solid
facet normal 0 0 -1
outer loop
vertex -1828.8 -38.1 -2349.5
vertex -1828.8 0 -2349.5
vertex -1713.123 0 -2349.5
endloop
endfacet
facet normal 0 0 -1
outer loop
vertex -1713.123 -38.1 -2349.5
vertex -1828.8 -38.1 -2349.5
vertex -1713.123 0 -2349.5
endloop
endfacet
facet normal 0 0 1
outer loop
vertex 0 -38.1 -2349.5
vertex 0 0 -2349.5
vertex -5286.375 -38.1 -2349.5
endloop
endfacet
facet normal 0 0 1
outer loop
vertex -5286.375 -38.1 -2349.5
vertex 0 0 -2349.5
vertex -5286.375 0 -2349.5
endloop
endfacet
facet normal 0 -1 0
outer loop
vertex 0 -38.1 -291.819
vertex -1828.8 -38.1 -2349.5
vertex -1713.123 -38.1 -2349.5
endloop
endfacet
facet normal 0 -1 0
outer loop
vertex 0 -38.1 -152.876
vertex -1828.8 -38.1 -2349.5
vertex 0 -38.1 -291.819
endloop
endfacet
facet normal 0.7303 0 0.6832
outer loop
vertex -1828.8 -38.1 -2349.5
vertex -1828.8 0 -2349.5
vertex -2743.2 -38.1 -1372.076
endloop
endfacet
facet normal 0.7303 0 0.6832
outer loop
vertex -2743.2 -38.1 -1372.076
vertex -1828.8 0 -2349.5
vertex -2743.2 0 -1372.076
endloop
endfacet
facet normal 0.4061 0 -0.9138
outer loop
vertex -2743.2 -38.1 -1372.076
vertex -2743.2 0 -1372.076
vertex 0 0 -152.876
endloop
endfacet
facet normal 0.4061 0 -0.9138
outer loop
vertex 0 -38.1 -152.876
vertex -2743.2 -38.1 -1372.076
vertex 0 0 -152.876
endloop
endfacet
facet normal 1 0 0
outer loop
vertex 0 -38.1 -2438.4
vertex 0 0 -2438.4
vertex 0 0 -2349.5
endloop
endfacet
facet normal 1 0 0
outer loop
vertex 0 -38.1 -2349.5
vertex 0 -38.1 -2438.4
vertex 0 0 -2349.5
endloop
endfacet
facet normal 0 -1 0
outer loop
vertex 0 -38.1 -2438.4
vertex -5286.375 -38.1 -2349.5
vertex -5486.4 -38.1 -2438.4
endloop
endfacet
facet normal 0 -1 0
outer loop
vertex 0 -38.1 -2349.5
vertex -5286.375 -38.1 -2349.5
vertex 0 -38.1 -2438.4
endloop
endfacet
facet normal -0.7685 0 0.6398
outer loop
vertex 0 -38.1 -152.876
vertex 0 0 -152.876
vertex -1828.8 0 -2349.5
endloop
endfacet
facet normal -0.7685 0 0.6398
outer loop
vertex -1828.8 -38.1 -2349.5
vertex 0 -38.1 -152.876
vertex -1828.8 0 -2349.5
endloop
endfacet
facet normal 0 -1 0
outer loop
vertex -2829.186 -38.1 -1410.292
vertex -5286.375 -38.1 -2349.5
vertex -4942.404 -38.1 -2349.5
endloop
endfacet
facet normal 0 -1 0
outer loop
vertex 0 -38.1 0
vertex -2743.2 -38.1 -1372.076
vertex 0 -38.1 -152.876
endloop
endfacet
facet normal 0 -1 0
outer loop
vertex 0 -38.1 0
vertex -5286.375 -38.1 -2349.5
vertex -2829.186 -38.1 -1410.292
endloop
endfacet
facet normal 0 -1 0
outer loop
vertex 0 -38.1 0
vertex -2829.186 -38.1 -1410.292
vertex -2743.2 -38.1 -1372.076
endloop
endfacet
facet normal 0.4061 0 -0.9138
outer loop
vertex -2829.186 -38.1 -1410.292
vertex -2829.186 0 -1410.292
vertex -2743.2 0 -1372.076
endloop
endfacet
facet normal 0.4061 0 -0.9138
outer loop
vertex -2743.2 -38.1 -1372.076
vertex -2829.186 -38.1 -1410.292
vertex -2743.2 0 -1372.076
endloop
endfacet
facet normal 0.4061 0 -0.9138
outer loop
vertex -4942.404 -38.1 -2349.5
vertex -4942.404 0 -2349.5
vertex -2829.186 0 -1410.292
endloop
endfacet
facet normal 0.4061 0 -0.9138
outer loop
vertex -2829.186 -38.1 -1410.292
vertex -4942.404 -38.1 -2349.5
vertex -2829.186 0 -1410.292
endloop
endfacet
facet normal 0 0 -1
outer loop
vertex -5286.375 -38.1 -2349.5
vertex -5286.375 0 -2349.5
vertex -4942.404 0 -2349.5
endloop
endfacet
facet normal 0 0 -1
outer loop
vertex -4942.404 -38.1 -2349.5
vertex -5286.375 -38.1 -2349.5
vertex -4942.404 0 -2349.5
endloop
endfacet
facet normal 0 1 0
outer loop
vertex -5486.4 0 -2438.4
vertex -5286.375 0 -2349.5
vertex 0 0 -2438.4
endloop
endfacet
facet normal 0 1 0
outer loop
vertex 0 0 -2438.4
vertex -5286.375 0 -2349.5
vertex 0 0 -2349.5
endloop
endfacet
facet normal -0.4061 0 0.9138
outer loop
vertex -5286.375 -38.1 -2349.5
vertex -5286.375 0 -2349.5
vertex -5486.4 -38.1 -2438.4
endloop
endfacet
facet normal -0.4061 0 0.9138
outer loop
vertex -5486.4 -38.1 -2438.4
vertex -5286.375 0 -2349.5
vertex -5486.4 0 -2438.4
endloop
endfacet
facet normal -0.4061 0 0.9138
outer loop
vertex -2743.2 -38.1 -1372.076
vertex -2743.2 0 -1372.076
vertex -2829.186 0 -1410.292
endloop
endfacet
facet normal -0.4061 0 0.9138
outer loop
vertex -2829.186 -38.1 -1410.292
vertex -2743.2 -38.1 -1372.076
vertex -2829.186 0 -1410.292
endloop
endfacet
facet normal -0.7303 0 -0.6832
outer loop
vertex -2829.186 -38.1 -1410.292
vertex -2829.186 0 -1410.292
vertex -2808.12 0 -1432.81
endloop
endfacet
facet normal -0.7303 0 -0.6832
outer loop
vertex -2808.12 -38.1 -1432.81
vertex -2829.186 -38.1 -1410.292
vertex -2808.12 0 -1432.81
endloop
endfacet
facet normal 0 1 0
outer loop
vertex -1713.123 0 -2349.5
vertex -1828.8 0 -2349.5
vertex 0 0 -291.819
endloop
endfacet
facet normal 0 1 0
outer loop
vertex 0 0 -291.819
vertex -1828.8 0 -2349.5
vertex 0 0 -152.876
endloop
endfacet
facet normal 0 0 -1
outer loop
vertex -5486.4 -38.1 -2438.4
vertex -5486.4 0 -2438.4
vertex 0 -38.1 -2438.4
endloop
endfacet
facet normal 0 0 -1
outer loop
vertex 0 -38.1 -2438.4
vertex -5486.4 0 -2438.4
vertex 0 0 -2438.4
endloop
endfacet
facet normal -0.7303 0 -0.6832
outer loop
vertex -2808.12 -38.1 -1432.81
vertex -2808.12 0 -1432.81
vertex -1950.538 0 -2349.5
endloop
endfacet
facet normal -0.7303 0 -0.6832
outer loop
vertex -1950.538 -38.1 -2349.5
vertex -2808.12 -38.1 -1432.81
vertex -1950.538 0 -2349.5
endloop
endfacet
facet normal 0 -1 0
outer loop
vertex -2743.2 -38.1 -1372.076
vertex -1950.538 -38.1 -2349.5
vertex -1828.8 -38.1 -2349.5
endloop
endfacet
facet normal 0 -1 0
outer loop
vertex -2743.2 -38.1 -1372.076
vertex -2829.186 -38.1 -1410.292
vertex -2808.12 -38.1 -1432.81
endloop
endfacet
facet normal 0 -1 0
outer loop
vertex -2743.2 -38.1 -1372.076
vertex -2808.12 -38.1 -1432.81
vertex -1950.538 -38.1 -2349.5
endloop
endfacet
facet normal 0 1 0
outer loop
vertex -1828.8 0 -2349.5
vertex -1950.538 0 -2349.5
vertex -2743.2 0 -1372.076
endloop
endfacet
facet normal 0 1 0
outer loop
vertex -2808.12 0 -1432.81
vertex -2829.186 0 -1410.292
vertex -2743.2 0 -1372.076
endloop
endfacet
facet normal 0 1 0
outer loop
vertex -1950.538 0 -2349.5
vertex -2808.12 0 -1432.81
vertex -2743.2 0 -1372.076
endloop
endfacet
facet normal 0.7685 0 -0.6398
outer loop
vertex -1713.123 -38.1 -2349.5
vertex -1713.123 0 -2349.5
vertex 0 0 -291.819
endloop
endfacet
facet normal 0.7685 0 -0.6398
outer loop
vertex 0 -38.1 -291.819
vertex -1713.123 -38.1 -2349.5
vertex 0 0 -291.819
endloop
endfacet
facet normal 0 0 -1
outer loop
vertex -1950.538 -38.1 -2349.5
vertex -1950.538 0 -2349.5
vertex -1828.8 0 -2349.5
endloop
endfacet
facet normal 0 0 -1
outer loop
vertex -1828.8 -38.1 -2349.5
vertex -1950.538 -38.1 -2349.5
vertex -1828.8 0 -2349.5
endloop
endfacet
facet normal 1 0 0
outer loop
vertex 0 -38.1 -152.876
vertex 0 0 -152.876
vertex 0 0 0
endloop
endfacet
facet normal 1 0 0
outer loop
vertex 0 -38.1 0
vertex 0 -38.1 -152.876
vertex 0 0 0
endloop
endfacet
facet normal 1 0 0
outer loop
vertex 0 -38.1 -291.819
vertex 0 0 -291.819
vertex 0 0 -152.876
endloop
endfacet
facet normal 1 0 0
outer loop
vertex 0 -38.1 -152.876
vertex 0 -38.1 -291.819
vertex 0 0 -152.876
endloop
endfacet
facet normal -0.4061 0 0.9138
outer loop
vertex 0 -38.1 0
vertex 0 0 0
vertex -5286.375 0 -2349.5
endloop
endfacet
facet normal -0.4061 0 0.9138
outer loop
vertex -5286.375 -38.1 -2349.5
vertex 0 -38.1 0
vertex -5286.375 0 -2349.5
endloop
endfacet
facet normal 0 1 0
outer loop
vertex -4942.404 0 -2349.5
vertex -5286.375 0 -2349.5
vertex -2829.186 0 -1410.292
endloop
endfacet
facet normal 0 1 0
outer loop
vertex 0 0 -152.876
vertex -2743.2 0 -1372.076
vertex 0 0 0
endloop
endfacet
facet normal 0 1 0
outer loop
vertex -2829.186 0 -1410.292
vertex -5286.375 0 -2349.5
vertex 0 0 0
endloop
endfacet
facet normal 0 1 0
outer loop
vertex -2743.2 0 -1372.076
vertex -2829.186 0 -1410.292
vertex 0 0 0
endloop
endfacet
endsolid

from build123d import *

# Parameters (mm, degrees)
F1_DEPTH = 38.1
F2_DEPTH = 38.1
F3_DEPTH = 38.1
F4_DEPTH = 38.1


with BuildPart() as f1:
    # F0 (on Front) → F1 (new body)
    with BuildSketch(Plane.XZ):
        Polygon((0, 0), (-5286.375, -2349.5), (-4942.403641, -2349.5), (-2829.185953, -1410.292138), (-2743.2, -1372.076159), (0, -152.876159), align=None)
    extrude(amount=F1_DEPTH)


with BuildPart() as f2:
    # F0 (on Front) → F2 (new body, through all)
    with BuildSketch(Plane.XZ):
        Polygon((-1950.537783, -2349.5), (-1828.8, -2349.5), (-2743.2, -1372.076159), (-2829.185953, -1410.292138), (-2808.119944, -1432.810095), align=None)
    extrude(amount=F2_DEPTH)


with BuildPart() as f3:
    # F0 (on Front) → F3 (new body, through all)
    with BuildSketch(Plane.XZ):
        Polygon((-1828.8, -2349.5), (-1713.122682, -2349.5), (0, -291.819486), (0, -152.876159), align=None)
    extrude(amount=F3_DEPTH)


with BuildPart() as f4:
    # F0 (on Front) → F4 (new body, through all)
    with BuildSketch(Plane.XZ):
        Polygon((-5486.4, -2438.4), (0, -2438.4), (0, -2349.5), (-1713.122682, -2349.5), (-1828.8, -2349.5), (-1950.537783, -2349.5), (-4942.403641, -2349.5), (-5286.375, -2349.5), align=None)
    extrude(amount=F4_DEPTH)


solid = Compound([f1.part, f2.part, f3.part, f4.part])
